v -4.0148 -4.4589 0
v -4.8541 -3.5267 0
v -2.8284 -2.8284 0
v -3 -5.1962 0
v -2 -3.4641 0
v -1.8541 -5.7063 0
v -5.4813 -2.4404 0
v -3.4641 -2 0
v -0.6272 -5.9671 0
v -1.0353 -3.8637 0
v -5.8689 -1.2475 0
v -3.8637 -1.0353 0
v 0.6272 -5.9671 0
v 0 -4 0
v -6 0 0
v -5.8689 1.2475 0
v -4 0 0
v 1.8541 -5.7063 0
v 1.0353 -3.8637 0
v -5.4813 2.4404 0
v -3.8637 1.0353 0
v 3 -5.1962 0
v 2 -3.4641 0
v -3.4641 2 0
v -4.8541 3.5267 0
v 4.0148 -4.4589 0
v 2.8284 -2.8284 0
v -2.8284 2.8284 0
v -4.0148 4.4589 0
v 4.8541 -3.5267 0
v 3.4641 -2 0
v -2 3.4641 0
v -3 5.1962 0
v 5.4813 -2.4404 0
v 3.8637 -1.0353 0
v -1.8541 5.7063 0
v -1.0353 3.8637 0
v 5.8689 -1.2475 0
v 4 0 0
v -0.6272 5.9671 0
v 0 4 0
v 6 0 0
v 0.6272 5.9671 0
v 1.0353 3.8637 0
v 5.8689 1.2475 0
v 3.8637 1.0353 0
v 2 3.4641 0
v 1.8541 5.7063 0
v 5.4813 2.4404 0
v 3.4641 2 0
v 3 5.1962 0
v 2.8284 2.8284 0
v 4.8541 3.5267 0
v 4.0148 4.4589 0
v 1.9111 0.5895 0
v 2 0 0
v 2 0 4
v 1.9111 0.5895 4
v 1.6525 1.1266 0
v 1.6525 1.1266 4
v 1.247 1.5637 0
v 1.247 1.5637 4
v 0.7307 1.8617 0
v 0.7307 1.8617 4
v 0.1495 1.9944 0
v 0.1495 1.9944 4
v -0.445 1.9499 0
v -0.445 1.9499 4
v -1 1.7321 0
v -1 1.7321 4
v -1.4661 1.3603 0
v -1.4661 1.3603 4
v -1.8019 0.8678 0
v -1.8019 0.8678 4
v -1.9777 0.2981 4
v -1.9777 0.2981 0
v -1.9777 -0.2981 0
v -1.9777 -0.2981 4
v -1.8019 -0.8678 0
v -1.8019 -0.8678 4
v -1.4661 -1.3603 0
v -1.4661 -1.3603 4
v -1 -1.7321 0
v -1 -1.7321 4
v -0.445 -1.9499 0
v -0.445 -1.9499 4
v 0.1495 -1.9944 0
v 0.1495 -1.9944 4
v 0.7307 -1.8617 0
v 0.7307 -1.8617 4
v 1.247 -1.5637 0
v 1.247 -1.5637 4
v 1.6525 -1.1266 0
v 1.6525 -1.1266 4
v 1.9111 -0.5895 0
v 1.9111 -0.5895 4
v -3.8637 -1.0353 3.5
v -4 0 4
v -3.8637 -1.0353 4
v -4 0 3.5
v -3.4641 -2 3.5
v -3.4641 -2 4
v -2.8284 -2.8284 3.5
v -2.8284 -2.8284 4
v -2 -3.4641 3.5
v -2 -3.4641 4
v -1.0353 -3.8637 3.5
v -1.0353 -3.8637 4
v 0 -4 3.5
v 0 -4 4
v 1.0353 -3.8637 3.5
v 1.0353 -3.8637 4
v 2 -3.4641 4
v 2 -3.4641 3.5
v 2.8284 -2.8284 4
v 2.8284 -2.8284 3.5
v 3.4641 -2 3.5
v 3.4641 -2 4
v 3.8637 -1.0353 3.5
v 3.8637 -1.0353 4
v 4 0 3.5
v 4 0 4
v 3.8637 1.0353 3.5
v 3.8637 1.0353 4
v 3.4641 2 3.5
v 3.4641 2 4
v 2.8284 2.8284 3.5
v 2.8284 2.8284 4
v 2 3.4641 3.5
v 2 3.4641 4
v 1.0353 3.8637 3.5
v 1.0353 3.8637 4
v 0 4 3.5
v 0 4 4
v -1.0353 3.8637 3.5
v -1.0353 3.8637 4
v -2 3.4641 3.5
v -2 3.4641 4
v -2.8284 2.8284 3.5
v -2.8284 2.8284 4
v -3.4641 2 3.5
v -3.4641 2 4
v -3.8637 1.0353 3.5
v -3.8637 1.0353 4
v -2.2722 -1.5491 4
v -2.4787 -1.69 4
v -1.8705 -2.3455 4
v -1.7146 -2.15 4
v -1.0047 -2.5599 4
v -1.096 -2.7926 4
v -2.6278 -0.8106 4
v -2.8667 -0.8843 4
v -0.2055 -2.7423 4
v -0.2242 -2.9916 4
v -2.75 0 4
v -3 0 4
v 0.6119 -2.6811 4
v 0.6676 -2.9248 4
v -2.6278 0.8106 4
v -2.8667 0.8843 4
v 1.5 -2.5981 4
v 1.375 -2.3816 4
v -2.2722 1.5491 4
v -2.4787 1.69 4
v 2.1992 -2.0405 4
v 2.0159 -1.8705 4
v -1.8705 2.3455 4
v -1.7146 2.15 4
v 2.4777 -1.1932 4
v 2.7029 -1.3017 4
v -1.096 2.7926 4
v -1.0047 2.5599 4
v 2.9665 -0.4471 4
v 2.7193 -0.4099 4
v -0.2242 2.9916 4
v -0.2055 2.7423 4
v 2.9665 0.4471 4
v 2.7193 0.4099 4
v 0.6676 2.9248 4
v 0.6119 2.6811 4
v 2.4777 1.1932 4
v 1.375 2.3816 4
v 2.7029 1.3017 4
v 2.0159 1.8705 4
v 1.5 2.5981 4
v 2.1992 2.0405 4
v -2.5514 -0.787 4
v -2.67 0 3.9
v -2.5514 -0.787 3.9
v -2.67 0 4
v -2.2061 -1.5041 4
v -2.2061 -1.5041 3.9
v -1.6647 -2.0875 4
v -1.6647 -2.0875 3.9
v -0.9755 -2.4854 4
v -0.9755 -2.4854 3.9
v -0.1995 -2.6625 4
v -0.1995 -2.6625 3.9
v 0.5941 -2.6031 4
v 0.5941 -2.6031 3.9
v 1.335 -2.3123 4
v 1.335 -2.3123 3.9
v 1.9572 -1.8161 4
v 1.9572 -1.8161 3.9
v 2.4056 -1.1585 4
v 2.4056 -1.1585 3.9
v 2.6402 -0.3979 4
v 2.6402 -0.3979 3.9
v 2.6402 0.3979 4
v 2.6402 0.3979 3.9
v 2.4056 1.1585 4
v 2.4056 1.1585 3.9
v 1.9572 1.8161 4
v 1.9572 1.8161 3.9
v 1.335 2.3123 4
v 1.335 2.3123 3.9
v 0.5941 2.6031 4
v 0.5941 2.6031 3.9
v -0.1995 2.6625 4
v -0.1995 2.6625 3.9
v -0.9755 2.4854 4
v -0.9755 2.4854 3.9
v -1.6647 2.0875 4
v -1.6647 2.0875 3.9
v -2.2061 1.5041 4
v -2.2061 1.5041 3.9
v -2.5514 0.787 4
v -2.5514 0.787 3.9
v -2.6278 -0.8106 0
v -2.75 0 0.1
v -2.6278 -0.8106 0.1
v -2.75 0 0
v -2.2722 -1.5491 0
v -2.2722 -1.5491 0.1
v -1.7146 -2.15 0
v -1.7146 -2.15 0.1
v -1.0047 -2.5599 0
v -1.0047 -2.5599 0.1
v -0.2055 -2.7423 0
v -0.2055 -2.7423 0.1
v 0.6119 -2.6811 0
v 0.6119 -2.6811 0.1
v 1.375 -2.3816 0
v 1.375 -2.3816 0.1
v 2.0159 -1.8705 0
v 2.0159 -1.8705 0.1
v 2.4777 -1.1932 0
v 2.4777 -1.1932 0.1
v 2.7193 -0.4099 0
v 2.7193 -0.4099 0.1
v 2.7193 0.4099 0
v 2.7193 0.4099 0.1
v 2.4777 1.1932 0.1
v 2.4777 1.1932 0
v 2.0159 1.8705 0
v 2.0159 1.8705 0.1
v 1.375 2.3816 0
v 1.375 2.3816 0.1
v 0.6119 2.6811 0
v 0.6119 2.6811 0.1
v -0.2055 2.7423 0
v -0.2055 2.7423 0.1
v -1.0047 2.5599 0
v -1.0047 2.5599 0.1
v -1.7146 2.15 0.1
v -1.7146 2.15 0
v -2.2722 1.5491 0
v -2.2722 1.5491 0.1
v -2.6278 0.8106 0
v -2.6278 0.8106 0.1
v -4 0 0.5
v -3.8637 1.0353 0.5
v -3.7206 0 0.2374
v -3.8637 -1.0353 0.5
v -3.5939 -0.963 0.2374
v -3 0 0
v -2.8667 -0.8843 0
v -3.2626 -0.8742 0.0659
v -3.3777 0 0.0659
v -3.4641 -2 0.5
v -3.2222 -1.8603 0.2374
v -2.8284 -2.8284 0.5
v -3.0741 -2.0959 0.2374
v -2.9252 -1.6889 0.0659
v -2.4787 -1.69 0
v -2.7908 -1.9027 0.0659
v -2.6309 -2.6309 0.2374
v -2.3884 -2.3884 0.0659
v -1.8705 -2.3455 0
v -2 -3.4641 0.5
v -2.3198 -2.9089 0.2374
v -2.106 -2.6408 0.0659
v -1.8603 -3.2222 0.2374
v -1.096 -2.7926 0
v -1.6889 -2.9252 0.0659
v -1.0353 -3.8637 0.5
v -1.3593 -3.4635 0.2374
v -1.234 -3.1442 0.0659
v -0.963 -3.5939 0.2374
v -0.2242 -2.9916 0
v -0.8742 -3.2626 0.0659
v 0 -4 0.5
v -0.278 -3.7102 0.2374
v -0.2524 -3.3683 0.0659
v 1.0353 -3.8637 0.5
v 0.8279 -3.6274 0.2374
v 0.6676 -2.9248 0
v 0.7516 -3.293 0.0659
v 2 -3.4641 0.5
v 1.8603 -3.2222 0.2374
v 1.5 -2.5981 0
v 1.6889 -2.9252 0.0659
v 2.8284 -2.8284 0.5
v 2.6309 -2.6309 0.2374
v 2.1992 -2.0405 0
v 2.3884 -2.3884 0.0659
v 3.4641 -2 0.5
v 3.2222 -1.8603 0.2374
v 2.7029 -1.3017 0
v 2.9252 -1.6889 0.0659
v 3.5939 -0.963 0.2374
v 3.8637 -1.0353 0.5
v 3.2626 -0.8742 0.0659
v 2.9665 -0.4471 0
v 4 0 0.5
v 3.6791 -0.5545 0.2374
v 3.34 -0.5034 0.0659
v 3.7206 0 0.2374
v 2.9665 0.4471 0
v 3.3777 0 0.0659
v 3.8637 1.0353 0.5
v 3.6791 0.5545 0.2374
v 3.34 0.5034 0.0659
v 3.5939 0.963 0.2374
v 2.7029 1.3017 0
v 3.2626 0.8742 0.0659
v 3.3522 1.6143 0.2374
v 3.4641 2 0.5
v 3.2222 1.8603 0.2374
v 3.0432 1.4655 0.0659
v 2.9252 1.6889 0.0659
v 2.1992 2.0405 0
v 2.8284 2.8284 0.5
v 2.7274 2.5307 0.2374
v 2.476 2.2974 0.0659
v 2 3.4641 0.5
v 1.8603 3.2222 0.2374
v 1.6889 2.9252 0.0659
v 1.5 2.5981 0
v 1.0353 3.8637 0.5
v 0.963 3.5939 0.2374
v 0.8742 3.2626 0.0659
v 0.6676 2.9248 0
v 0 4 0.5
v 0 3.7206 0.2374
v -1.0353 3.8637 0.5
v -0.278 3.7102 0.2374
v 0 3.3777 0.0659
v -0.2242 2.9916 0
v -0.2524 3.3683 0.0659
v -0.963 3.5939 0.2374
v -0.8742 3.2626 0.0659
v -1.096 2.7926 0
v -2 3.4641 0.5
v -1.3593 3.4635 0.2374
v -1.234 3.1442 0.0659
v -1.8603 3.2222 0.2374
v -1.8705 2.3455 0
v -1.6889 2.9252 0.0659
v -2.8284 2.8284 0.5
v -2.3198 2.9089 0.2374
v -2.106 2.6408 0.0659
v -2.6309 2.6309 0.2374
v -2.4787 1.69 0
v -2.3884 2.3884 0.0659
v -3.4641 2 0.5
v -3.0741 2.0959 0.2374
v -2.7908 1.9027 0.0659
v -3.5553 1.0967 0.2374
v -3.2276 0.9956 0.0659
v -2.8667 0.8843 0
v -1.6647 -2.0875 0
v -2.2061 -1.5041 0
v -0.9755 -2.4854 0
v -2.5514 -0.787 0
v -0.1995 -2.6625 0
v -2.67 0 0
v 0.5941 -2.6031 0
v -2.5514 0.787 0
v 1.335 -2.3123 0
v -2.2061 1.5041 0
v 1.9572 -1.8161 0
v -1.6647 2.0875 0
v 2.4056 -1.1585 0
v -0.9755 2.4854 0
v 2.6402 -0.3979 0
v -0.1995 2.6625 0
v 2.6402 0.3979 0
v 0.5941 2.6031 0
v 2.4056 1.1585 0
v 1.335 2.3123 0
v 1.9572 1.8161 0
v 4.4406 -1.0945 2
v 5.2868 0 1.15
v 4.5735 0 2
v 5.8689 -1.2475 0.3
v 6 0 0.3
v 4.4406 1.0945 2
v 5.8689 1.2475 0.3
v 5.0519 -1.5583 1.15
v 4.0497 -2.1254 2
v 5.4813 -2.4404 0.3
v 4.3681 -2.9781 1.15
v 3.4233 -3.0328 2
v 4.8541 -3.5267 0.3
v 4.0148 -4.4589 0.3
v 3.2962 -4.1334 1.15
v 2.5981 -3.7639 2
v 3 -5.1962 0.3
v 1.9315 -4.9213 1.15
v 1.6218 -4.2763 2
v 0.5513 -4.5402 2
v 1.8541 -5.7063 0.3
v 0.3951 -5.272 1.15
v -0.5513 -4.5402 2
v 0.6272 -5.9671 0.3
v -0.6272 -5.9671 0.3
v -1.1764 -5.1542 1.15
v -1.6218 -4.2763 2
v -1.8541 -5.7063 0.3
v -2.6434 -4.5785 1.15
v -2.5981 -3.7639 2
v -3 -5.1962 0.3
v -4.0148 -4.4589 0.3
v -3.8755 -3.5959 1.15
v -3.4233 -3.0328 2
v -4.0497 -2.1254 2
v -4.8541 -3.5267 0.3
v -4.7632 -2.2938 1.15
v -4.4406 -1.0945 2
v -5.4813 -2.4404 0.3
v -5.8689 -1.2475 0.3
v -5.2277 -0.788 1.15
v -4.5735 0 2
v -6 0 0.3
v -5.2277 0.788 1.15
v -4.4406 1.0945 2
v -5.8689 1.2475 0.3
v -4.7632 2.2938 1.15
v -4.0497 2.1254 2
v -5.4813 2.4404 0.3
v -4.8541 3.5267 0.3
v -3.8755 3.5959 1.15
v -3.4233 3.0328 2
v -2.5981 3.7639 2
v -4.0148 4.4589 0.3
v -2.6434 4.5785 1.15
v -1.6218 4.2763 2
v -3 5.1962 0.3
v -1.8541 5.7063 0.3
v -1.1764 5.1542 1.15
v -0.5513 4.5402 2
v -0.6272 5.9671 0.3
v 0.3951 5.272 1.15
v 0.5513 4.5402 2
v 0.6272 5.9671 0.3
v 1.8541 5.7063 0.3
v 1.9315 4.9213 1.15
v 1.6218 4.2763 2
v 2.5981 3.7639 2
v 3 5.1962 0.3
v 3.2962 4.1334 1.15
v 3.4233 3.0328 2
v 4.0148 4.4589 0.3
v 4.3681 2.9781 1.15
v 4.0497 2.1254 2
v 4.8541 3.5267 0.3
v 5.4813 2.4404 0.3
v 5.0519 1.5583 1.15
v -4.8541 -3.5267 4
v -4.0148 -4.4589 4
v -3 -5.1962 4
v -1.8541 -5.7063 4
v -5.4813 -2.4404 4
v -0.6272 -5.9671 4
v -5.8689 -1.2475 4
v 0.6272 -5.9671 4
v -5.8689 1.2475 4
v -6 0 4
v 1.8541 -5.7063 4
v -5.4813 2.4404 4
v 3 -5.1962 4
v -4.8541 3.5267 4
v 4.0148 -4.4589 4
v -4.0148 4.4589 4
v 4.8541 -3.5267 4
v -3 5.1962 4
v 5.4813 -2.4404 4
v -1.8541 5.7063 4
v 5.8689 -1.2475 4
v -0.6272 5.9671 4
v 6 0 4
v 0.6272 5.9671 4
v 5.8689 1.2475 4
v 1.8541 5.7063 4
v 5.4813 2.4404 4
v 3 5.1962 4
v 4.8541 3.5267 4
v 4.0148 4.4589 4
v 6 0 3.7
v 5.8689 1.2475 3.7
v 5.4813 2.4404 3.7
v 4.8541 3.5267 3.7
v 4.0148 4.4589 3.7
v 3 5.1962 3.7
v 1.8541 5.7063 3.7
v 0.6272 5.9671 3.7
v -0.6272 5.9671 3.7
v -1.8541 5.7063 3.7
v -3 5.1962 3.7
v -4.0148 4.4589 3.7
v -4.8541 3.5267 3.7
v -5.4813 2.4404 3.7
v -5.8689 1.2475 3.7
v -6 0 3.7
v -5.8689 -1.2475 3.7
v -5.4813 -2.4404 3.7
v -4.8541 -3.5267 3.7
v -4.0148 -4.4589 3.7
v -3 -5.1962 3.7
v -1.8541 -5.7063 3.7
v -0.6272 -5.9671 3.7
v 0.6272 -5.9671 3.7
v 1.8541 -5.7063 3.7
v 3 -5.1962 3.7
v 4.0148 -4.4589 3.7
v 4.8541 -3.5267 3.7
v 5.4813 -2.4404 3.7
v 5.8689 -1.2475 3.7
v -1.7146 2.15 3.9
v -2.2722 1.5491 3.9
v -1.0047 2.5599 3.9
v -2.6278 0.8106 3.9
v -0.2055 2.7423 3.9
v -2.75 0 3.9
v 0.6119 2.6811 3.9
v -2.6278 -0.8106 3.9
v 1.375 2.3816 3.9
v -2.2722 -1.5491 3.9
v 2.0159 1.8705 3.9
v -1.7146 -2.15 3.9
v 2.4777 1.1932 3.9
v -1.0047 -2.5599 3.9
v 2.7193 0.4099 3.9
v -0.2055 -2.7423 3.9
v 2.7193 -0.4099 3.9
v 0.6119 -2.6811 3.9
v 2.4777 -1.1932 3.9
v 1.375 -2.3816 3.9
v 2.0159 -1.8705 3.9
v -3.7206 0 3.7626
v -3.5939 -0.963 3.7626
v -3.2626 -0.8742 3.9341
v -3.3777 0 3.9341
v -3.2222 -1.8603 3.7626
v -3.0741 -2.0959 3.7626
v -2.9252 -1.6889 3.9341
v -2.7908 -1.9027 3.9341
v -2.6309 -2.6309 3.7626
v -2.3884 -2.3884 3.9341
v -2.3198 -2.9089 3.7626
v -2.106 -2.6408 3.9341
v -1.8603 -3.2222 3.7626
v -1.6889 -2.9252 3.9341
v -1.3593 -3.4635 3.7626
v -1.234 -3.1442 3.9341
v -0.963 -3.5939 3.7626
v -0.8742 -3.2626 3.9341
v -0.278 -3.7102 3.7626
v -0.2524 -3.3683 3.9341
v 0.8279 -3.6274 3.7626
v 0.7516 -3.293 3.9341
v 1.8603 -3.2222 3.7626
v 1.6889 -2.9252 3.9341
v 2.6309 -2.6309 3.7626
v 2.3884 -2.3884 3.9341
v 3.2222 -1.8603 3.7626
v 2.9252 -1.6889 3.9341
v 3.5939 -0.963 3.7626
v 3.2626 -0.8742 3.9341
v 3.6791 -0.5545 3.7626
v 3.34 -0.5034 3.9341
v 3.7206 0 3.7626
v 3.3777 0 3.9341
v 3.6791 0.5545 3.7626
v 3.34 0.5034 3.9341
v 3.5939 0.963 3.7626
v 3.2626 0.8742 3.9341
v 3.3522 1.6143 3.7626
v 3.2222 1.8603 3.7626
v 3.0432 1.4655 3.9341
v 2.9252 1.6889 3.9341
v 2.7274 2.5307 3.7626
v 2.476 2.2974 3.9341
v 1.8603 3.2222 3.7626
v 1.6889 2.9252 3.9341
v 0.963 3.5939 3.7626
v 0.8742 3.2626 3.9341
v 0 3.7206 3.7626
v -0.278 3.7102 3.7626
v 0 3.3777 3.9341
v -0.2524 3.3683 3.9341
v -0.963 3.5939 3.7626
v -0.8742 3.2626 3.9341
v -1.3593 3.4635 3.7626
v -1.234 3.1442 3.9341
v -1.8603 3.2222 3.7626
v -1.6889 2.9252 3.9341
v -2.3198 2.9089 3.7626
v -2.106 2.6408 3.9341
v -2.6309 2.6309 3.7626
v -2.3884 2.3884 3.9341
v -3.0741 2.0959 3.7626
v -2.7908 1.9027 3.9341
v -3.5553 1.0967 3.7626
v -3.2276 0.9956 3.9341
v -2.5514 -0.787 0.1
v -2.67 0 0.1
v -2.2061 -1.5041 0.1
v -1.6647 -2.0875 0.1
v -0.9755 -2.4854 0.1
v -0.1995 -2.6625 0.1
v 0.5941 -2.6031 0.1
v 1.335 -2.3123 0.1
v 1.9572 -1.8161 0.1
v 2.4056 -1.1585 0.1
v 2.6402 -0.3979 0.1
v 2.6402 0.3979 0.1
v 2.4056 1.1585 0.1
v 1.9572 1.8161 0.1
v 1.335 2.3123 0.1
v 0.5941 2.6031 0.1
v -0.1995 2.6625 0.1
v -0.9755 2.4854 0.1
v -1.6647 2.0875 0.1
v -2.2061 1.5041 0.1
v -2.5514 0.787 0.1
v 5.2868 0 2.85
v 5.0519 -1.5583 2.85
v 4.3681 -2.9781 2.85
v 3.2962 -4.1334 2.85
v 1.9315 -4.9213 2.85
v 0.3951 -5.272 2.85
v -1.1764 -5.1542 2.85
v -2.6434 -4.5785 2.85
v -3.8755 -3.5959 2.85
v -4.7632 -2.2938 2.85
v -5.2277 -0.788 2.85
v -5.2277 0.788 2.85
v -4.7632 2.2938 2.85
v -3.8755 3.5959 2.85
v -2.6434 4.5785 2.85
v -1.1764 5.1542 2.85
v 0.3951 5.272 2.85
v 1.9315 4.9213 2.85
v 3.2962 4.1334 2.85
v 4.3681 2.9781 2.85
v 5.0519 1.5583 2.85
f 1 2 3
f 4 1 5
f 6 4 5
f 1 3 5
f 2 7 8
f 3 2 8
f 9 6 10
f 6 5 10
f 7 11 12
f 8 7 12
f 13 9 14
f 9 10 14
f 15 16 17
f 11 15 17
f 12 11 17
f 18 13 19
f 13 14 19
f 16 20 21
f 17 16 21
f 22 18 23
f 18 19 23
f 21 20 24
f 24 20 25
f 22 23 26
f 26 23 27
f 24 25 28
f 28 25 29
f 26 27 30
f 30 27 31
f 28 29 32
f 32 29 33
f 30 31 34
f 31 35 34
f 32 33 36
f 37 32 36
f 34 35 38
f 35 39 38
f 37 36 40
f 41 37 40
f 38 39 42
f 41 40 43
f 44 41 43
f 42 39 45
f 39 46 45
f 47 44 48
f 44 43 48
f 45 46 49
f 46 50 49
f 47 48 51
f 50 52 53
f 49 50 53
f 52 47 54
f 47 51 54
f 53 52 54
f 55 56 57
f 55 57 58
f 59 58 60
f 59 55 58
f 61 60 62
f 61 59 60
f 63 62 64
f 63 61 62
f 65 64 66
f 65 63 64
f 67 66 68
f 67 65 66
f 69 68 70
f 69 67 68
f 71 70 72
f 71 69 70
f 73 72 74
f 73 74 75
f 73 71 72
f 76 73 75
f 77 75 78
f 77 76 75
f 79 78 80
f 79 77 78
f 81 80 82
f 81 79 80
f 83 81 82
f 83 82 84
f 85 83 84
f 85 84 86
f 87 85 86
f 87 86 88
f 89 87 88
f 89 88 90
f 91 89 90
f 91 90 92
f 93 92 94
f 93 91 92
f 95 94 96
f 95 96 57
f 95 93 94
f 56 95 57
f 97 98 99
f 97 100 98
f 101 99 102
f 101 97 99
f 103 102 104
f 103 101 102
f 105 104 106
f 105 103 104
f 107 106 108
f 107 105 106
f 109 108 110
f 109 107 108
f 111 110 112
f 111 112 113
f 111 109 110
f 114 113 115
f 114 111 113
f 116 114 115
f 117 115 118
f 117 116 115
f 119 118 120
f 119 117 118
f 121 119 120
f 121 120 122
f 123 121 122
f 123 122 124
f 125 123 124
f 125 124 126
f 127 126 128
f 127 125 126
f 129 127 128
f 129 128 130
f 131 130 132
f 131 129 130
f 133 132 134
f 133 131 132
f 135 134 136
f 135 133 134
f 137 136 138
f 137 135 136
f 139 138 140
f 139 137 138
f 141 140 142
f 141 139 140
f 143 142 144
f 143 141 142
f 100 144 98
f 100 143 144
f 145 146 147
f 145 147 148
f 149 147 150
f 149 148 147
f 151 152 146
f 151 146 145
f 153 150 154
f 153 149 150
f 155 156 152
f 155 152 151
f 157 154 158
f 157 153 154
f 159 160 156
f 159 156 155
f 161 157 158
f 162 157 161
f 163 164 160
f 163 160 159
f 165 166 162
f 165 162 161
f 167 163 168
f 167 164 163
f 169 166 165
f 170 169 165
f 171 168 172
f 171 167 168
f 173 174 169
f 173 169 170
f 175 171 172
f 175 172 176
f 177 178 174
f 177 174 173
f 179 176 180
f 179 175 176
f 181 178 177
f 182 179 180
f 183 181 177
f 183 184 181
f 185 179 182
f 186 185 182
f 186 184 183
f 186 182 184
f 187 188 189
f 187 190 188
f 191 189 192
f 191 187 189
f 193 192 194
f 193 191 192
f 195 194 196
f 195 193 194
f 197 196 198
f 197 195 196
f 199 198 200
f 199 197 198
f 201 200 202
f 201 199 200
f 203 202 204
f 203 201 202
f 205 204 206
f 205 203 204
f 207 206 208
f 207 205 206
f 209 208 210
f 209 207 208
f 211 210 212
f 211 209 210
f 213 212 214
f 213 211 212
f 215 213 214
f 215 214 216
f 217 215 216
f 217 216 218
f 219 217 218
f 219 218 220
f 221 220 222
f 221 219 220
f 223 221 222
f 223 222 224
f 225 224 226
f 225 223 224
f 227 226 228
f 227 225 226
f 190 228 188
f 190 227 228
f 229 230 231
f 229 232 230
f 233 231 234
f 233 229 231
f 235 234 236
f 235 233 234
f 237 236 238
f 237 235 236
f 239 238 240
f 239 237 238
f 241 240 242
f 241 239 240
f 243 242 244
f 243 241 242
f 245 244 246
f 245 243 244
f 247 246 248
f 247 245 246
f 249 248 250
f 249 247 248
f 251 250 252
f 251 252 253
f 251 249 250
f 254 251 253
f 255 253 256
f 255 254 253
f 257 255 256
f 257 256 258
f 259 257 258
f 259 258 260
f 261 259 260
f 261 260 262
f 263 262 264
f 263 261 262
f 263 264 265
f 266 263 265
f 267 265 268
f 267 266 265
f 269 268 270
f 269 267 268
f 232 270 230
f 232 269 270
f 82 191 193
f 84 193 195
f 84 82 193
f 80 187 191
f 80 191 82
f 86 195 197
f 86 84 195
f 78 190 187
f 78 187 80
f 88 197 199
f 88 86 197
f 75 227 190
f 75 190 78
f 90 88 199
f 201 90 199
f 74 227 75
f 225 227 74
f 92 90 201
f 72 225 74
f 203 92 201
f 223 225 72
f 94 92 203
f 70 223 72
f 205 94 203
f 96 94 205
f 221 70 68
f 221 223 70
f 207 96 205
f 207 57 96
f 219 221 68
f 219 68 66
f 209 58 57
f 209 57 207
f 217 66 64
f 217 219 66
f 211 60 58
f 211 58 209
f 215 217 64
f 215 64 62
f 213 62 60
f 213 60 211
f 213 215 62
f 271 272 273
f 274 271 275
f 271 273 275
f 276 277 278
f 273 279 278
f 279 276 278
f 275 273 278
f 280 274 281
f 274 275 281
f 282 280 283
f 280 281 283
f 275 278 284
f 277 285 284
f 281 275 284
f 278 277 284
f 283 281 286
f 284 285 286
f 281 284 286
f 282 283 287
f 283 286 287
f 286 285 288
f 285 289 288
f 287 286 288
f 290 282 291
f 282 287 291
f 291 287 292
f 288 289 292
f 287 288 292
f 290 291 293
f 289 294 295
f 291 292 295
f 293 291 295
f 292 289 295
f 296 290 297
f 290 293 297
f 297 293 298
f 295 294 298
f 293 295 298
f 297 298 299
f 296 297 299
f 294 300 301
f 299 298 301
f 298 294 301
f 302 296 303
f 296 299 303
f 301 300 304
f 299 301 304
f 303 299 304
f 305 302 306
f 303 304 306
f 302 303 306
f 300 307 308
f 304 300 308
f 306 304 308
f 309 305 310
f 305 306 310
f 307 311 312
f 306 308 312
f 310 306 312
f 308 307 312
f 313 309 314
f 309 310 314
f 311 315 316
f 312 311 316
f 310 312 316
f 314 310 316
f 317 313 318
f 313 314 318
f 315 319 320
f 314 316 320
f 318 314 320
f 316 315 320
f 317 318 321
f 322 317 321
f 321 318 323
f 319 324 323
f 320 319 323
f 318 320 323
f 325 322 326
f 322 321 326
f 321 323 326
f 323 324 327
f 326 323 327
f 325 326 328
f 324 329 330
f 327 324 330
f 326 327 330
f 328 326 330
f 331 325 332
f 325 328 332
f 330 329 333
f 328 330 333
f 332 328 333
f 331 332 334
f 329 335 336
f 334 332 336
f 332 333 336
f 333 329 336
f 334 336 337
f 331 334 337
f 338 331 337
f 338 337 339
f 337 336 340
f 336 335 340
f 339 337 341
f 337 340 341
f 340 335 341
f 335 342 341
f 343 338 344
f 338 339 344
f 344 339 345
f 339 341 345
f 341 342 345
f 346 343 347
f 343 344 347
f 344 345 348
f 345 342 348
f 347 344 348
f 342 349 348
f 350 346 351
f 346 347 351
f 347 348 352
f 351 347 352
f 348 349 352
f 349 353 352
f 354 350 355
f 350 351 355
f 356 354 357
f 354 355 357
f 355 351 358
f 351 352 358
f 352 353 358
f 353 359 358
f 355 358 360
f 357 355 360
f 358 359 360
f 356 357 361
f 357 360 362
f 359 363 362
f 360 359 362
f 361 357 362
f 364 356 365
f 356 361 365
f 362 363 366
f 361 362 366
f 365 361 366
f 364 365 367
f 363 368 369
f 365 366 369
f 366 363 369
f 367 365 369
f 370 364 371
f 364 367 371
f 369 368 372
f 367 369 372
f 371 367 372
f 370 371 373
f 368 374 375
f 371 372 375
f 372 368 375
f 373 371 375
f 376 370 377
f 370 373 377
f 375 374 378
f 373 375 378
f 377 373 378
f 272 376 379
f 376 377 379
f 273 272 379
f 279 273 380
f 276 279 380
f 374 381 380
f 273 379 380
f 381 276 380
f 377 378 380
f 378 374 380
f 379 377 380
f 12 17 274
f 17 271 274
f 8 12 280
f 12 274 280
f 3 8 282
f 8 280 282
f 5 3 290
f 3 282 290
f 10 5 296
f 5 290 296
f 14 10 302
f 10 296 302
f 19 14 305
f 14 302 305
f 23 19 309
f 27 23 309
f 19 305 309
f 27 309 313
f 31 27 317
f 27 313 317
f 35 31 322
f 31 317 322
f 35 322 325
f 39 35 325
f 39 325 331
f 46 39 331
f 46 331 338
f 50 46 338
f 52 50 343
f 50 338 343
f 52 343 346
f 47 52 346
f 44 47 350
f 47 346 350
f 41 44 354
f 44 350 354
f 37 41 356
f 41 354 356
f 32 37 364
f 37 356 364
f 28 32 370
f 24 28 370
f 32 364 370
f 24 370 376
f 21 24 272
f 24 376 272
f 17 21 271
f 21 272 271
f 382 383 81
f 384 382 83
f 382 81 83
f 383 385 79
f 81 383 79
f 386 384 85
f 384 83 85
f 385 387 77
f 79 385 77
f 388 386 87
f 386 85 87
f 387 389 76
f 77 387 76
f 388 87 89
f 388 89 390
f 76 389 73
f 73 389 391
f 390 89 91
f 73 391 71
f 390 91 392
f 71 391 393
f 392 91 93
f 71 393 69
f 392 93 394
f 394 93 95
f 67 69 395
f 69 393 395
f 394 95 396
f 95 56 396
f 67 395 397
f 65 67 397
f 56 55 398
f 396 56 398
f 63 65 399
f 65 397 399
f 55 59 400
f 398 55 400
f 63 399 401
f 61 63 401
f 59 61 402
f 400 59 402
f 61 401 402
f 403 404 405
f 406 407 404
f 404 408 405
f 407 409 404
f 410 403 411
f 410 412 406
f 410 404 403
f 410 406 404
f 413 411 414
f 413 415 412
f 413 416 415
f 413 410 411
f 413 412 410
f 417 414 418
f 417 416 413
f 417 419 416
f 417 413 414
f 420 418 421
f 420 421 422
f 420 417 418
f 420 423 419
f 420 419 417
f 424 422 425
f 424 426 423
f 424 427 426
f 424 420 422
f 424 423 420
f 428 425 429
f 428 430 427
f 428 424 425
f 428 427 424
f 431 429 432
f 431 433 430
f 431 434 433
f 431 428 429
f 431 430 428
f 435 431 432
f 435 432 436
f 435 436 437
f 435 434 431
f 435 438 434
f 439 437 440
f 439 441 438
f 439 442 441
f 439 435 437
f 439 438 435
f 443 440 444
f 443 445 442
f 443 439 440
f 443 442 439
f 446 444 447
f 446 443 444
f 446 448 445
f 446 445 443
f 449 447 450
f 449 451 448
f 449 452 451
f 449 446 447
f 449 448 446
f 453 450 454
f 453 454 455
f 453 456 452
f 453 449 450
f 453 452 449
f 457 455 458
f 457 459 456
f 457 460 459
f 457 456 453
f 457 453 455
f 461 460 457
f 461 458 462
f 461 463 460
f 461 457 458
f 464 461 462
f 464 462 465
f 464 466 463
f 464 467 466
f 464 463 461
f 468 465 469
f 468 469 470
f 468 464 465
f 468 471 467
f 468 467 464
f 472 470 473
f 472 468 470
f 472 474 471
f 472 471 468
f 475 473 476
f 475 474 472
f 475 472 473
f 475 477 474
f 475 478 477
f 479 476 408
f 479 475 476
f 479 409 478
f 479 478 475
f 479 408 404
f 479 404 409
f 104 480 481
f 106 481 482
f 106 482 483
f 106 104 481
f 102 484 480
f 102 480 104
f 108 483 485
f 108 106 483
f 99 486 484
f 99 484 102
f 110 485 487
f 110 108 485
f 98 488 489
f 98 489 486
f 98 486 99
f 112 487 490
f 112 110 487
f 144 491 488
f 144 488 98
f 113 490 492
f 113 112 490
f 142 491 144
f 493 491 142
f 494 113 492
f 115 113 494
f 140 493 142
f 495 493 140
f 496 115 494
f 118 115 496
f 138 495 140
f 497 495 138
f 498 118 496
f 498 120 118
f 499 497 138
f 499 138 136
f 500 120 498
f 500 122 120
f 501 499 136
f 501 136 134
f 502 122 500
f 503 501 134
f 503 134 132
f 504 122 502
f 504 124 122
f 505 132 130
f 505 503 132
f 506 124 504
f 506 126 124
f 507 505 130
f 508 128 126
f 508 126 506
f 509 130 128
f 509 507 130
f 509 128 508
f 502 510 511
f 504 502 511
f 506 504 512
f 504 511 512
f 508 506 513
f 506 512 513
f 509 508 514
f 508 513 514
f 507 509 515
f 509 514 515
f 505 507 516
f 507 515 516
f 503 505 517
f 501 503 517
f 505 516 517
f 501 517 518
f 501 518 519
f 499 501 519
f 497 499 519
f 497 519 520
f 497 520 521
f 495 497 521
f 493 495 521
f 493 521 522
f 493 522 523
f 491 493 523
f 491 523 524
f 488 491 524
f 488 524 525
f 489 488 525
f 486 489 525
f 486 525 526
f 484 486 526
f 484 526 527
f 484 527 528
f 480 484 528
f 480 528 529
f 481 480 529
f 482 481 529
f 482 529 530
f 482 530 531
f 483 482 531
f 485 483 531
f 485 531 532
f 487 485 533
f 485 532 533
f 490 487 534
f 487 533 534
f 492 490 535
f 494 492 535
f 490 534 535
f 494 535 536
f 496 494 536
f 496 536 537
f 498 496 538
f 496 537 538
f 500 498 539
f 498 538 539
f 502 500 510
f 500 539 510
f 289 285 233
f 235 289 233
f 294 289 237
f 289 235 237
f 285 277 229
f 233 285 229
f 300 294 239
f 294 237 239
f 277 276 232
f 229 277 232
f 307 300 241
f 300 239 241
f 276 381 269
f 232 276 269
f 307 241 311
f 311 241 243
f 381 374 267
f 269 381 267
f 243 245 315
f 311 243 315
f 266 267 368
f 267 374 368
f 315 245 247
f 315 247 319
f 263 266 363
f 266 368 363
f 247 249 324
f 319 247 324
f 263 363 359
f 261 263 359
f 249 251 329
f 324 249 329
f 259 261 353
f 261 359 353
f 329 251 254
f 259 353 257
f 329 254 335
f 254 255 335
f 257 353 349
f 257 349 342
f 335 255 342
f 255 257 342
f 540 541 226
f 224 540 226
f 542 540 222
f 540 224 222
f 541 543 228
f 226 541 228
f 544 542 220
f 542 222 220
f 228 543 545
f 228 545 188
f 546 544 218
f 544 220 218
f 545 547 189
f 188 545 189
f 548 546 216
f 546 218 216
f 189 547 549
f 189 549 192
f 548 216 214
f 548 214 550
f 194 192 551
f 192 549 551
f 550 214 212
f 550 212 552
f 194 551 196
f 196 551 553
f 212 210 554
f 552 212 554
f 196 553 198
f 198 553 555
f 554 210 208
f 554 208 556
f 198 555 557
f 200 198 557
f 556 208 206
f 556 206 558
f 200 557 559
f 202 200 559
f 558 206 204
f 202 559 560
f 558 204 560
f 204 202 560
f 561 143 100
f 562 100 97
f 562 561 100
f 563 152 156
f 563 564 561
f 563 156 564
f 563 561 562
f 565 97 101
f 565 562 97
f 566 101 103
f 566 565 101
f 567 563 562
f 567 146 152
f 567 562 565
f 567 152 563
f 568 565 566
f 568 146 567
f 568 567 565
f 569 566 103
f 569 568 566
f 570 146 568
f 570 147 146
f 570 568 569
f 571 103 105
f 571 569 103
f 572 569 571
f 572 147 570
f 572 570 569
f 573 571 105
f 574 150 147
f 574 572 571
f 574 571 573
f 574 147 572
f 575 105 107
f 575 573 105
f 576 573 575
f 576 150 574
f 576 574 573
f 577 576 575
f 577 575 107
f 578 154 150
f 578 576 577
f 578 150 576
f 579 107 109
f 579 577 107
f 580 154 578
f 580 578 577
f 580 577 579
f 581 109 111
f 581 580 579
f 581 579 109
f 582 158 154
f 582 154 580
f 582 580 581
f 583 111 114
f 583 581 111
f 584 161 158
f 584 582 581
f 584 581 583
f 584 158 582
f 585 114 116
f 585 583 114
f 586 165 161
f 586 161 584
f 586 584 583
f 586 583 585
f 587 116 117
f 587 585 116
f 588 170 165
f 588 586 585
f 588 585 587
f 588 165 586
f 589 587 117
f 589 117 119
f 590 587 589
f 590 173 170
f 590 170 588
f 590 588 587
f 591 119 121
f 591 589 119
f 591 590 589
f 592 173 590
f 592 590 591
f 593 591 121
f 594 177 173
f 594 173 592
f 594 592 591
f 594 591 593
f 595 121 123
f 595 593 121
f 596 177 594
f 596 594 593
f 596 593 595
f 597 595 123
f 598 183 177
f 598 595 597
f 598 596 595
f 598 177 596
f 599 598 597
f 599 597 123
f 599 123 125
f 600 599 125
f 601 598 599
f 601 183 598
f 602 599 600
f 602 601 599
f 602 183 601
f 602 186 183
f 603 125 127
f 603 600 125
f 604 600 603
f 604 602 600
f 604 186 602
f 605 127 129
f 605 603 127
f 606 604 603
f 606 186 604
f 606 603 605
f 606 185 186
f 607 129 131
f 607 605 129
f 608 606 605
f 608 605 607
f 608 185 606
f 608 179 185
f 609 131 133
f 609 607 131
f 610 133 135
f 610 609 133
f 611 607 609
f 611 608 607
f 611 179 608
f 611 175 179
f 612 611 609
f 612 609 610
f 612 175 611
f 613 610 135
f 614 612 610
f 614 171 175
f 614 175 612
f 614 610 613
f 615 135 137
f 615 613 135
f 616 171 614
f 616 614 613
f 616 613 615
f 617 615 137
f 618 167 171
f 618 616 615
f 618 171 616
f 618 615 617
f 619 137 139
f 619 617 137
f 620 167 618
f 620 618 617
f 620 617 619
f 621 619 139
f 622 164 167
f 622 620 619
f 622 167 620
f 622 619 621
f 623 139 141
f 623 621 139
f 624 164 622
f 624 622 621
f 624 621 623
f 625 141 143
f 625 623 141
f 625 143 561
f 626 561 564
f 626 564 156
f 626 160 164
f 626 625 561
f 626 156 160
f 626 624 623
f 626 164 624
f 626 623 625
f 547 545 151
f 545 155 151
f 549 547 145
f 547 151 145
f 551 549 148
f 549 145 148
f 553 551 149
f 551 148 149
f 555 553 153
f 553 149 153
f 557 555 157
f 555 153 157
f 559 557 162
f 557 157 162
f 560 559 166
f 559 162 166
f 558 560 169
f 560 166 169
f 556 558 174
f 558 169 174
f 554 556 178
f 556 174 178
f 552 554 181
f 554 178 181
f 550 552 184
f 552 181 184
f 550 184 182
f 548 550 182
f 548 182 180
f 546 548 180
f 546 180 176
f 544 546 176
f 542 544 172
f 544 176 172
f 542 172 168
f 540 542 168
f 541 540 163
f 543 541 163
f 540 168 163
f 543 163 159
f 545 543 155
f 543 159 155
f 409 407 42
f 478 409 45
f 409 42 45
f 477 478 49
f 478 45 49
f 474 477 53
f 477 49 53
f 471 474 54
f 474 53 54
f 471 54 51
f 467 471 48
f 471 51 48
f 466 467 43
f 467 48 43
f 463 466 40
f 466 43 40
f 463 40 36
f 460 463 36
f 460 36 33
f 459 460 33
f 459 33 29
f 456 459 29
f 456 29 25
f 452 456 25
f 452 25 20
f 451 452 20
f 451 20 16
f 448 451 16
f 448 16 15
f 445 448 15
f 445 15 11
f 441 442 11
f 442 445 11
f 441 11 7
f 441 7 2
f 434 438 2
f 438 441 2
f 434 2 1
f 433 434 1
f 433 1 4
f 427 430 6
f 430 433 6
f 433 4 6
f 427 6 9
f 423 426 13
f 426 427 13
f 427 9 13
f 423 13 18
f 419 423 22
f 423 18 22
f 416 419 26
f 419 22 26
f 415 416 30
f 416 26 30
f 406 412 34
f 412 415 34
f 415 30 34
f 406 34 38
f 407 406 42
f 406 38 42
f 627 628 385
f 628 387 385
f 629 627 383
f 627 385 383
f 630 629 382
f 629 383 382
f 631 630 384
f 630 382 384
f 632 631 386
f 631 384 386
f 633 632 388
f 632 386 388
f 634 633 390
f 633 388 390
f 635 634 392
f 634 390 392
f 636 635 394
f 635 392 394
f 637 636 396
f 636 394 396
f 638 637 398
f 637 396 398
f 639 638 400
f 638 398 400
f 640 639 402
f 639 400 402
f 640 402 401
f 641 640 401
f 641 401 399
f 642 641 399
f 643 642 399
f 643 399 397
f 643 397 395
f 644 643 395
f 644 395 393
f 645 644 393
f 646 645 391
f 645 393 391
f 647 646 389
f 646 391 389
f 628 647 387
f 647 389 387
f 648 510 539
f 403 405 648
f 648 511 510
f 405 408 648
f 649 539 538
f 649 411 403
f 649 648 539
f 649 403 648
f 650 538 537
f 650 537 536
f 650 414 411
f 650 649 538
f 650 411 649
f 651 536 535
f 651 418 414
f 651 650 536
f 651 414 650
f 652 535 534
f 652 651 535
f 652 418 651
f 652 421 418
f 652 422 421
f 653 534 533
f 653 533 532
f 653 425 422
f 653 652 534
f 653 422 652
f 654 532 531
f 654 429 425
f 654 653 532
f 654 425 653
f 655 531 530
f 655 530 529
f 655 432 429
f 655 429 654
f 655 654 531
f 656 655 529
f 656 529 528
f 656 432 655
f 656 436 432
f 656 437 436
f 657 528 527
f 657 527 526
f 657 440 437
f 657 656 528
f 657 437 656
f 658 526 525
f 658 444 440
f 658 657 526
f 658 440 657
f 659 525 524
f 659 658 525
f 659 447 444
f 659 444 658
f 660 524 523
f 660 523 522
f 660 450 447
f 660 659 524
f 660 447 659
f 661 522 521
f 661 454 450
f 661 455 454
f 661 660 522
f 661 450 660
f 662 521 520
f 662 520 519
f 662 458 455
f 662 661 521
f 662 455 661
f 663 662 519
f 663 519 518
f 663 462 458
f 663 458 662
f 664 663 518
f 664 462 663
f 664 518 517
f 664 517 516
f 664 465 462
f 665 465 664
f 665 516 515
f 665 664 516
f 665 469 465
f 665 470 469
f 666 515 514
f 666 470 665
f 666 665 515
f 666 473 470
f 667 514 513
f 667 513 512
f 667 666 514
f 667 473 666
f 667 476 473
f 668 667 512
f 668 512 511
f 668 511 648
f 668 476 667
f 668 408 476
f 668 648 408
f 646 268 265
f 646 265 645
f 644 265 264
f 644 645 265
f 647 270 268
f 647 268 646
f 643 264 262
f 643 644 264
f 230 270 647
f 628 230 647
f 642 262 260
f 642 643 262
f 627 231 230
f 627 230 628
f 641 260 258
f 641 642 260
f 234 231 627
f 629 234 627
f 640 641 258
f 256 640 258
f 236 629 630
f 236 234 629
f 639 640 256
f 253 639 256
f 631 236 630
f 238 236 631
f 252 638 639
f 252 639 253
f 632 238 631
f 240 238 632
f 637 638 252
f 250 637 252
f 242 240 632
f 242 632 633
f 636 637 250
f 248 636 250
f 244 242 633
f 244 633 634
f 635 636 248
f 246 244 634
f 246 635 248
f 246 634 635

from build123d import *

# Parameters (mm, degrees)
SKETCH_3_R        = 6
EXTRUDE_1_DEPTH   = 4
OTHER_1_OUTLINE_R = 2
OTHER_1_DEPTH     = 4
SKETCH_14_W       = 0.1
SKETCH_14_H       = 0.08


# Read off the part's stored shape, not the designer's step: 孔1
with BuildPart() as part:
    # 草图3 → 凸台-拉伸1 (new body)
    with BuildSketch(Plane.XY):
        Circle(SKETCH_3_R)
    extrude(amount=EXTRUDE_1_DEPTH)

    # 孔1 outline → 孔1 (cut)
    with BuildSketch(Plane.XY):
        Circle(OTHER_1_OUTLINE_R)
    extrude(amount=OTHER_1_DEPTH, mode=Mode.SUBTRACT)

    # 草图11 → 切除-旋转1 (revolve, cut)
    with BuildSketch(Plane(origin=(0, 0, 0), x_dir=(0, 0, -1), z_dir=(1, 0, 0)), mode=Mode.PRIVATE) as cut_revolve_1_sk:
        Polygon((-0.3, 6), (-3.7, 6), (-2, 4.573530627), align=None)
    revolve(cut_revolve_1_sk.sketch.rotate(Axis((0, 0, 4.816901408), (0, 0, -1)), 90), axis=Axis((0, 0, 4.816901408), (0, 0, -1)), mode=Mode.SUBTRACT)

    # 草图12 → 切除-旋转2 (revolve, cut)
    with BuildSketch(Plane(origin=(0, 0, 0), x_dir=(0, 0, -1), z_dir=(1, 0, 0)), mode=Mode.PRIVATE) as cut_revolve_2_sk:
        with BuildLine():
            Line((0, 4), (-0.5, 4))
            ThreePointArc((-0.5, 4), (-0.139152669, 3.555423666), (0, 3))
            Line((0, 3), (0, 4))
        make_face()
    cut_revolve_2 = revolve(cut_revolve_2_sk.sketch.rotate(Axis((0, 0, 0), (0, 0, 1)), 90), axis=Axis((0, 0, 0), (0, 0, 1)), mode=Mode.SUBTRACT)

    # 镜向1: 切除-旋转2 across plane
    add(cut_revolve_2.mirror(Plane.XY.offset(2)), mode=Mode.SUBTRACT)

    # 草图14 → 切除-旋转3 (revolve, cut)
    with BuildSketch(Plane(origin=(0, 0, 0), x_dir=(0, 0, -1), z_dir=(1, 0, 0)), mode=Mode.PRIVATE) as cut_revolve_3_sk:
        with Locations((-0.05, 2.71)):
            Rectangle(SKETCH_14_W, SKETCH_14_H)
    cut_revolve_3 = revolve(cut_revolve_3_sk.sketch.rotate(Axis((0, 0, 0), (0, 0, 1)), 90), axis=Axis((0, 0, 0), (0, 0, 1)), mode=Mode.SUBTRACT)

    # 镜向2: 切除-旋转3 across plane
    add(cut_revolve_3.mirror(Plane.XY.offset(2)), mode=Mode.SUBTRACT)


solid = part.part
